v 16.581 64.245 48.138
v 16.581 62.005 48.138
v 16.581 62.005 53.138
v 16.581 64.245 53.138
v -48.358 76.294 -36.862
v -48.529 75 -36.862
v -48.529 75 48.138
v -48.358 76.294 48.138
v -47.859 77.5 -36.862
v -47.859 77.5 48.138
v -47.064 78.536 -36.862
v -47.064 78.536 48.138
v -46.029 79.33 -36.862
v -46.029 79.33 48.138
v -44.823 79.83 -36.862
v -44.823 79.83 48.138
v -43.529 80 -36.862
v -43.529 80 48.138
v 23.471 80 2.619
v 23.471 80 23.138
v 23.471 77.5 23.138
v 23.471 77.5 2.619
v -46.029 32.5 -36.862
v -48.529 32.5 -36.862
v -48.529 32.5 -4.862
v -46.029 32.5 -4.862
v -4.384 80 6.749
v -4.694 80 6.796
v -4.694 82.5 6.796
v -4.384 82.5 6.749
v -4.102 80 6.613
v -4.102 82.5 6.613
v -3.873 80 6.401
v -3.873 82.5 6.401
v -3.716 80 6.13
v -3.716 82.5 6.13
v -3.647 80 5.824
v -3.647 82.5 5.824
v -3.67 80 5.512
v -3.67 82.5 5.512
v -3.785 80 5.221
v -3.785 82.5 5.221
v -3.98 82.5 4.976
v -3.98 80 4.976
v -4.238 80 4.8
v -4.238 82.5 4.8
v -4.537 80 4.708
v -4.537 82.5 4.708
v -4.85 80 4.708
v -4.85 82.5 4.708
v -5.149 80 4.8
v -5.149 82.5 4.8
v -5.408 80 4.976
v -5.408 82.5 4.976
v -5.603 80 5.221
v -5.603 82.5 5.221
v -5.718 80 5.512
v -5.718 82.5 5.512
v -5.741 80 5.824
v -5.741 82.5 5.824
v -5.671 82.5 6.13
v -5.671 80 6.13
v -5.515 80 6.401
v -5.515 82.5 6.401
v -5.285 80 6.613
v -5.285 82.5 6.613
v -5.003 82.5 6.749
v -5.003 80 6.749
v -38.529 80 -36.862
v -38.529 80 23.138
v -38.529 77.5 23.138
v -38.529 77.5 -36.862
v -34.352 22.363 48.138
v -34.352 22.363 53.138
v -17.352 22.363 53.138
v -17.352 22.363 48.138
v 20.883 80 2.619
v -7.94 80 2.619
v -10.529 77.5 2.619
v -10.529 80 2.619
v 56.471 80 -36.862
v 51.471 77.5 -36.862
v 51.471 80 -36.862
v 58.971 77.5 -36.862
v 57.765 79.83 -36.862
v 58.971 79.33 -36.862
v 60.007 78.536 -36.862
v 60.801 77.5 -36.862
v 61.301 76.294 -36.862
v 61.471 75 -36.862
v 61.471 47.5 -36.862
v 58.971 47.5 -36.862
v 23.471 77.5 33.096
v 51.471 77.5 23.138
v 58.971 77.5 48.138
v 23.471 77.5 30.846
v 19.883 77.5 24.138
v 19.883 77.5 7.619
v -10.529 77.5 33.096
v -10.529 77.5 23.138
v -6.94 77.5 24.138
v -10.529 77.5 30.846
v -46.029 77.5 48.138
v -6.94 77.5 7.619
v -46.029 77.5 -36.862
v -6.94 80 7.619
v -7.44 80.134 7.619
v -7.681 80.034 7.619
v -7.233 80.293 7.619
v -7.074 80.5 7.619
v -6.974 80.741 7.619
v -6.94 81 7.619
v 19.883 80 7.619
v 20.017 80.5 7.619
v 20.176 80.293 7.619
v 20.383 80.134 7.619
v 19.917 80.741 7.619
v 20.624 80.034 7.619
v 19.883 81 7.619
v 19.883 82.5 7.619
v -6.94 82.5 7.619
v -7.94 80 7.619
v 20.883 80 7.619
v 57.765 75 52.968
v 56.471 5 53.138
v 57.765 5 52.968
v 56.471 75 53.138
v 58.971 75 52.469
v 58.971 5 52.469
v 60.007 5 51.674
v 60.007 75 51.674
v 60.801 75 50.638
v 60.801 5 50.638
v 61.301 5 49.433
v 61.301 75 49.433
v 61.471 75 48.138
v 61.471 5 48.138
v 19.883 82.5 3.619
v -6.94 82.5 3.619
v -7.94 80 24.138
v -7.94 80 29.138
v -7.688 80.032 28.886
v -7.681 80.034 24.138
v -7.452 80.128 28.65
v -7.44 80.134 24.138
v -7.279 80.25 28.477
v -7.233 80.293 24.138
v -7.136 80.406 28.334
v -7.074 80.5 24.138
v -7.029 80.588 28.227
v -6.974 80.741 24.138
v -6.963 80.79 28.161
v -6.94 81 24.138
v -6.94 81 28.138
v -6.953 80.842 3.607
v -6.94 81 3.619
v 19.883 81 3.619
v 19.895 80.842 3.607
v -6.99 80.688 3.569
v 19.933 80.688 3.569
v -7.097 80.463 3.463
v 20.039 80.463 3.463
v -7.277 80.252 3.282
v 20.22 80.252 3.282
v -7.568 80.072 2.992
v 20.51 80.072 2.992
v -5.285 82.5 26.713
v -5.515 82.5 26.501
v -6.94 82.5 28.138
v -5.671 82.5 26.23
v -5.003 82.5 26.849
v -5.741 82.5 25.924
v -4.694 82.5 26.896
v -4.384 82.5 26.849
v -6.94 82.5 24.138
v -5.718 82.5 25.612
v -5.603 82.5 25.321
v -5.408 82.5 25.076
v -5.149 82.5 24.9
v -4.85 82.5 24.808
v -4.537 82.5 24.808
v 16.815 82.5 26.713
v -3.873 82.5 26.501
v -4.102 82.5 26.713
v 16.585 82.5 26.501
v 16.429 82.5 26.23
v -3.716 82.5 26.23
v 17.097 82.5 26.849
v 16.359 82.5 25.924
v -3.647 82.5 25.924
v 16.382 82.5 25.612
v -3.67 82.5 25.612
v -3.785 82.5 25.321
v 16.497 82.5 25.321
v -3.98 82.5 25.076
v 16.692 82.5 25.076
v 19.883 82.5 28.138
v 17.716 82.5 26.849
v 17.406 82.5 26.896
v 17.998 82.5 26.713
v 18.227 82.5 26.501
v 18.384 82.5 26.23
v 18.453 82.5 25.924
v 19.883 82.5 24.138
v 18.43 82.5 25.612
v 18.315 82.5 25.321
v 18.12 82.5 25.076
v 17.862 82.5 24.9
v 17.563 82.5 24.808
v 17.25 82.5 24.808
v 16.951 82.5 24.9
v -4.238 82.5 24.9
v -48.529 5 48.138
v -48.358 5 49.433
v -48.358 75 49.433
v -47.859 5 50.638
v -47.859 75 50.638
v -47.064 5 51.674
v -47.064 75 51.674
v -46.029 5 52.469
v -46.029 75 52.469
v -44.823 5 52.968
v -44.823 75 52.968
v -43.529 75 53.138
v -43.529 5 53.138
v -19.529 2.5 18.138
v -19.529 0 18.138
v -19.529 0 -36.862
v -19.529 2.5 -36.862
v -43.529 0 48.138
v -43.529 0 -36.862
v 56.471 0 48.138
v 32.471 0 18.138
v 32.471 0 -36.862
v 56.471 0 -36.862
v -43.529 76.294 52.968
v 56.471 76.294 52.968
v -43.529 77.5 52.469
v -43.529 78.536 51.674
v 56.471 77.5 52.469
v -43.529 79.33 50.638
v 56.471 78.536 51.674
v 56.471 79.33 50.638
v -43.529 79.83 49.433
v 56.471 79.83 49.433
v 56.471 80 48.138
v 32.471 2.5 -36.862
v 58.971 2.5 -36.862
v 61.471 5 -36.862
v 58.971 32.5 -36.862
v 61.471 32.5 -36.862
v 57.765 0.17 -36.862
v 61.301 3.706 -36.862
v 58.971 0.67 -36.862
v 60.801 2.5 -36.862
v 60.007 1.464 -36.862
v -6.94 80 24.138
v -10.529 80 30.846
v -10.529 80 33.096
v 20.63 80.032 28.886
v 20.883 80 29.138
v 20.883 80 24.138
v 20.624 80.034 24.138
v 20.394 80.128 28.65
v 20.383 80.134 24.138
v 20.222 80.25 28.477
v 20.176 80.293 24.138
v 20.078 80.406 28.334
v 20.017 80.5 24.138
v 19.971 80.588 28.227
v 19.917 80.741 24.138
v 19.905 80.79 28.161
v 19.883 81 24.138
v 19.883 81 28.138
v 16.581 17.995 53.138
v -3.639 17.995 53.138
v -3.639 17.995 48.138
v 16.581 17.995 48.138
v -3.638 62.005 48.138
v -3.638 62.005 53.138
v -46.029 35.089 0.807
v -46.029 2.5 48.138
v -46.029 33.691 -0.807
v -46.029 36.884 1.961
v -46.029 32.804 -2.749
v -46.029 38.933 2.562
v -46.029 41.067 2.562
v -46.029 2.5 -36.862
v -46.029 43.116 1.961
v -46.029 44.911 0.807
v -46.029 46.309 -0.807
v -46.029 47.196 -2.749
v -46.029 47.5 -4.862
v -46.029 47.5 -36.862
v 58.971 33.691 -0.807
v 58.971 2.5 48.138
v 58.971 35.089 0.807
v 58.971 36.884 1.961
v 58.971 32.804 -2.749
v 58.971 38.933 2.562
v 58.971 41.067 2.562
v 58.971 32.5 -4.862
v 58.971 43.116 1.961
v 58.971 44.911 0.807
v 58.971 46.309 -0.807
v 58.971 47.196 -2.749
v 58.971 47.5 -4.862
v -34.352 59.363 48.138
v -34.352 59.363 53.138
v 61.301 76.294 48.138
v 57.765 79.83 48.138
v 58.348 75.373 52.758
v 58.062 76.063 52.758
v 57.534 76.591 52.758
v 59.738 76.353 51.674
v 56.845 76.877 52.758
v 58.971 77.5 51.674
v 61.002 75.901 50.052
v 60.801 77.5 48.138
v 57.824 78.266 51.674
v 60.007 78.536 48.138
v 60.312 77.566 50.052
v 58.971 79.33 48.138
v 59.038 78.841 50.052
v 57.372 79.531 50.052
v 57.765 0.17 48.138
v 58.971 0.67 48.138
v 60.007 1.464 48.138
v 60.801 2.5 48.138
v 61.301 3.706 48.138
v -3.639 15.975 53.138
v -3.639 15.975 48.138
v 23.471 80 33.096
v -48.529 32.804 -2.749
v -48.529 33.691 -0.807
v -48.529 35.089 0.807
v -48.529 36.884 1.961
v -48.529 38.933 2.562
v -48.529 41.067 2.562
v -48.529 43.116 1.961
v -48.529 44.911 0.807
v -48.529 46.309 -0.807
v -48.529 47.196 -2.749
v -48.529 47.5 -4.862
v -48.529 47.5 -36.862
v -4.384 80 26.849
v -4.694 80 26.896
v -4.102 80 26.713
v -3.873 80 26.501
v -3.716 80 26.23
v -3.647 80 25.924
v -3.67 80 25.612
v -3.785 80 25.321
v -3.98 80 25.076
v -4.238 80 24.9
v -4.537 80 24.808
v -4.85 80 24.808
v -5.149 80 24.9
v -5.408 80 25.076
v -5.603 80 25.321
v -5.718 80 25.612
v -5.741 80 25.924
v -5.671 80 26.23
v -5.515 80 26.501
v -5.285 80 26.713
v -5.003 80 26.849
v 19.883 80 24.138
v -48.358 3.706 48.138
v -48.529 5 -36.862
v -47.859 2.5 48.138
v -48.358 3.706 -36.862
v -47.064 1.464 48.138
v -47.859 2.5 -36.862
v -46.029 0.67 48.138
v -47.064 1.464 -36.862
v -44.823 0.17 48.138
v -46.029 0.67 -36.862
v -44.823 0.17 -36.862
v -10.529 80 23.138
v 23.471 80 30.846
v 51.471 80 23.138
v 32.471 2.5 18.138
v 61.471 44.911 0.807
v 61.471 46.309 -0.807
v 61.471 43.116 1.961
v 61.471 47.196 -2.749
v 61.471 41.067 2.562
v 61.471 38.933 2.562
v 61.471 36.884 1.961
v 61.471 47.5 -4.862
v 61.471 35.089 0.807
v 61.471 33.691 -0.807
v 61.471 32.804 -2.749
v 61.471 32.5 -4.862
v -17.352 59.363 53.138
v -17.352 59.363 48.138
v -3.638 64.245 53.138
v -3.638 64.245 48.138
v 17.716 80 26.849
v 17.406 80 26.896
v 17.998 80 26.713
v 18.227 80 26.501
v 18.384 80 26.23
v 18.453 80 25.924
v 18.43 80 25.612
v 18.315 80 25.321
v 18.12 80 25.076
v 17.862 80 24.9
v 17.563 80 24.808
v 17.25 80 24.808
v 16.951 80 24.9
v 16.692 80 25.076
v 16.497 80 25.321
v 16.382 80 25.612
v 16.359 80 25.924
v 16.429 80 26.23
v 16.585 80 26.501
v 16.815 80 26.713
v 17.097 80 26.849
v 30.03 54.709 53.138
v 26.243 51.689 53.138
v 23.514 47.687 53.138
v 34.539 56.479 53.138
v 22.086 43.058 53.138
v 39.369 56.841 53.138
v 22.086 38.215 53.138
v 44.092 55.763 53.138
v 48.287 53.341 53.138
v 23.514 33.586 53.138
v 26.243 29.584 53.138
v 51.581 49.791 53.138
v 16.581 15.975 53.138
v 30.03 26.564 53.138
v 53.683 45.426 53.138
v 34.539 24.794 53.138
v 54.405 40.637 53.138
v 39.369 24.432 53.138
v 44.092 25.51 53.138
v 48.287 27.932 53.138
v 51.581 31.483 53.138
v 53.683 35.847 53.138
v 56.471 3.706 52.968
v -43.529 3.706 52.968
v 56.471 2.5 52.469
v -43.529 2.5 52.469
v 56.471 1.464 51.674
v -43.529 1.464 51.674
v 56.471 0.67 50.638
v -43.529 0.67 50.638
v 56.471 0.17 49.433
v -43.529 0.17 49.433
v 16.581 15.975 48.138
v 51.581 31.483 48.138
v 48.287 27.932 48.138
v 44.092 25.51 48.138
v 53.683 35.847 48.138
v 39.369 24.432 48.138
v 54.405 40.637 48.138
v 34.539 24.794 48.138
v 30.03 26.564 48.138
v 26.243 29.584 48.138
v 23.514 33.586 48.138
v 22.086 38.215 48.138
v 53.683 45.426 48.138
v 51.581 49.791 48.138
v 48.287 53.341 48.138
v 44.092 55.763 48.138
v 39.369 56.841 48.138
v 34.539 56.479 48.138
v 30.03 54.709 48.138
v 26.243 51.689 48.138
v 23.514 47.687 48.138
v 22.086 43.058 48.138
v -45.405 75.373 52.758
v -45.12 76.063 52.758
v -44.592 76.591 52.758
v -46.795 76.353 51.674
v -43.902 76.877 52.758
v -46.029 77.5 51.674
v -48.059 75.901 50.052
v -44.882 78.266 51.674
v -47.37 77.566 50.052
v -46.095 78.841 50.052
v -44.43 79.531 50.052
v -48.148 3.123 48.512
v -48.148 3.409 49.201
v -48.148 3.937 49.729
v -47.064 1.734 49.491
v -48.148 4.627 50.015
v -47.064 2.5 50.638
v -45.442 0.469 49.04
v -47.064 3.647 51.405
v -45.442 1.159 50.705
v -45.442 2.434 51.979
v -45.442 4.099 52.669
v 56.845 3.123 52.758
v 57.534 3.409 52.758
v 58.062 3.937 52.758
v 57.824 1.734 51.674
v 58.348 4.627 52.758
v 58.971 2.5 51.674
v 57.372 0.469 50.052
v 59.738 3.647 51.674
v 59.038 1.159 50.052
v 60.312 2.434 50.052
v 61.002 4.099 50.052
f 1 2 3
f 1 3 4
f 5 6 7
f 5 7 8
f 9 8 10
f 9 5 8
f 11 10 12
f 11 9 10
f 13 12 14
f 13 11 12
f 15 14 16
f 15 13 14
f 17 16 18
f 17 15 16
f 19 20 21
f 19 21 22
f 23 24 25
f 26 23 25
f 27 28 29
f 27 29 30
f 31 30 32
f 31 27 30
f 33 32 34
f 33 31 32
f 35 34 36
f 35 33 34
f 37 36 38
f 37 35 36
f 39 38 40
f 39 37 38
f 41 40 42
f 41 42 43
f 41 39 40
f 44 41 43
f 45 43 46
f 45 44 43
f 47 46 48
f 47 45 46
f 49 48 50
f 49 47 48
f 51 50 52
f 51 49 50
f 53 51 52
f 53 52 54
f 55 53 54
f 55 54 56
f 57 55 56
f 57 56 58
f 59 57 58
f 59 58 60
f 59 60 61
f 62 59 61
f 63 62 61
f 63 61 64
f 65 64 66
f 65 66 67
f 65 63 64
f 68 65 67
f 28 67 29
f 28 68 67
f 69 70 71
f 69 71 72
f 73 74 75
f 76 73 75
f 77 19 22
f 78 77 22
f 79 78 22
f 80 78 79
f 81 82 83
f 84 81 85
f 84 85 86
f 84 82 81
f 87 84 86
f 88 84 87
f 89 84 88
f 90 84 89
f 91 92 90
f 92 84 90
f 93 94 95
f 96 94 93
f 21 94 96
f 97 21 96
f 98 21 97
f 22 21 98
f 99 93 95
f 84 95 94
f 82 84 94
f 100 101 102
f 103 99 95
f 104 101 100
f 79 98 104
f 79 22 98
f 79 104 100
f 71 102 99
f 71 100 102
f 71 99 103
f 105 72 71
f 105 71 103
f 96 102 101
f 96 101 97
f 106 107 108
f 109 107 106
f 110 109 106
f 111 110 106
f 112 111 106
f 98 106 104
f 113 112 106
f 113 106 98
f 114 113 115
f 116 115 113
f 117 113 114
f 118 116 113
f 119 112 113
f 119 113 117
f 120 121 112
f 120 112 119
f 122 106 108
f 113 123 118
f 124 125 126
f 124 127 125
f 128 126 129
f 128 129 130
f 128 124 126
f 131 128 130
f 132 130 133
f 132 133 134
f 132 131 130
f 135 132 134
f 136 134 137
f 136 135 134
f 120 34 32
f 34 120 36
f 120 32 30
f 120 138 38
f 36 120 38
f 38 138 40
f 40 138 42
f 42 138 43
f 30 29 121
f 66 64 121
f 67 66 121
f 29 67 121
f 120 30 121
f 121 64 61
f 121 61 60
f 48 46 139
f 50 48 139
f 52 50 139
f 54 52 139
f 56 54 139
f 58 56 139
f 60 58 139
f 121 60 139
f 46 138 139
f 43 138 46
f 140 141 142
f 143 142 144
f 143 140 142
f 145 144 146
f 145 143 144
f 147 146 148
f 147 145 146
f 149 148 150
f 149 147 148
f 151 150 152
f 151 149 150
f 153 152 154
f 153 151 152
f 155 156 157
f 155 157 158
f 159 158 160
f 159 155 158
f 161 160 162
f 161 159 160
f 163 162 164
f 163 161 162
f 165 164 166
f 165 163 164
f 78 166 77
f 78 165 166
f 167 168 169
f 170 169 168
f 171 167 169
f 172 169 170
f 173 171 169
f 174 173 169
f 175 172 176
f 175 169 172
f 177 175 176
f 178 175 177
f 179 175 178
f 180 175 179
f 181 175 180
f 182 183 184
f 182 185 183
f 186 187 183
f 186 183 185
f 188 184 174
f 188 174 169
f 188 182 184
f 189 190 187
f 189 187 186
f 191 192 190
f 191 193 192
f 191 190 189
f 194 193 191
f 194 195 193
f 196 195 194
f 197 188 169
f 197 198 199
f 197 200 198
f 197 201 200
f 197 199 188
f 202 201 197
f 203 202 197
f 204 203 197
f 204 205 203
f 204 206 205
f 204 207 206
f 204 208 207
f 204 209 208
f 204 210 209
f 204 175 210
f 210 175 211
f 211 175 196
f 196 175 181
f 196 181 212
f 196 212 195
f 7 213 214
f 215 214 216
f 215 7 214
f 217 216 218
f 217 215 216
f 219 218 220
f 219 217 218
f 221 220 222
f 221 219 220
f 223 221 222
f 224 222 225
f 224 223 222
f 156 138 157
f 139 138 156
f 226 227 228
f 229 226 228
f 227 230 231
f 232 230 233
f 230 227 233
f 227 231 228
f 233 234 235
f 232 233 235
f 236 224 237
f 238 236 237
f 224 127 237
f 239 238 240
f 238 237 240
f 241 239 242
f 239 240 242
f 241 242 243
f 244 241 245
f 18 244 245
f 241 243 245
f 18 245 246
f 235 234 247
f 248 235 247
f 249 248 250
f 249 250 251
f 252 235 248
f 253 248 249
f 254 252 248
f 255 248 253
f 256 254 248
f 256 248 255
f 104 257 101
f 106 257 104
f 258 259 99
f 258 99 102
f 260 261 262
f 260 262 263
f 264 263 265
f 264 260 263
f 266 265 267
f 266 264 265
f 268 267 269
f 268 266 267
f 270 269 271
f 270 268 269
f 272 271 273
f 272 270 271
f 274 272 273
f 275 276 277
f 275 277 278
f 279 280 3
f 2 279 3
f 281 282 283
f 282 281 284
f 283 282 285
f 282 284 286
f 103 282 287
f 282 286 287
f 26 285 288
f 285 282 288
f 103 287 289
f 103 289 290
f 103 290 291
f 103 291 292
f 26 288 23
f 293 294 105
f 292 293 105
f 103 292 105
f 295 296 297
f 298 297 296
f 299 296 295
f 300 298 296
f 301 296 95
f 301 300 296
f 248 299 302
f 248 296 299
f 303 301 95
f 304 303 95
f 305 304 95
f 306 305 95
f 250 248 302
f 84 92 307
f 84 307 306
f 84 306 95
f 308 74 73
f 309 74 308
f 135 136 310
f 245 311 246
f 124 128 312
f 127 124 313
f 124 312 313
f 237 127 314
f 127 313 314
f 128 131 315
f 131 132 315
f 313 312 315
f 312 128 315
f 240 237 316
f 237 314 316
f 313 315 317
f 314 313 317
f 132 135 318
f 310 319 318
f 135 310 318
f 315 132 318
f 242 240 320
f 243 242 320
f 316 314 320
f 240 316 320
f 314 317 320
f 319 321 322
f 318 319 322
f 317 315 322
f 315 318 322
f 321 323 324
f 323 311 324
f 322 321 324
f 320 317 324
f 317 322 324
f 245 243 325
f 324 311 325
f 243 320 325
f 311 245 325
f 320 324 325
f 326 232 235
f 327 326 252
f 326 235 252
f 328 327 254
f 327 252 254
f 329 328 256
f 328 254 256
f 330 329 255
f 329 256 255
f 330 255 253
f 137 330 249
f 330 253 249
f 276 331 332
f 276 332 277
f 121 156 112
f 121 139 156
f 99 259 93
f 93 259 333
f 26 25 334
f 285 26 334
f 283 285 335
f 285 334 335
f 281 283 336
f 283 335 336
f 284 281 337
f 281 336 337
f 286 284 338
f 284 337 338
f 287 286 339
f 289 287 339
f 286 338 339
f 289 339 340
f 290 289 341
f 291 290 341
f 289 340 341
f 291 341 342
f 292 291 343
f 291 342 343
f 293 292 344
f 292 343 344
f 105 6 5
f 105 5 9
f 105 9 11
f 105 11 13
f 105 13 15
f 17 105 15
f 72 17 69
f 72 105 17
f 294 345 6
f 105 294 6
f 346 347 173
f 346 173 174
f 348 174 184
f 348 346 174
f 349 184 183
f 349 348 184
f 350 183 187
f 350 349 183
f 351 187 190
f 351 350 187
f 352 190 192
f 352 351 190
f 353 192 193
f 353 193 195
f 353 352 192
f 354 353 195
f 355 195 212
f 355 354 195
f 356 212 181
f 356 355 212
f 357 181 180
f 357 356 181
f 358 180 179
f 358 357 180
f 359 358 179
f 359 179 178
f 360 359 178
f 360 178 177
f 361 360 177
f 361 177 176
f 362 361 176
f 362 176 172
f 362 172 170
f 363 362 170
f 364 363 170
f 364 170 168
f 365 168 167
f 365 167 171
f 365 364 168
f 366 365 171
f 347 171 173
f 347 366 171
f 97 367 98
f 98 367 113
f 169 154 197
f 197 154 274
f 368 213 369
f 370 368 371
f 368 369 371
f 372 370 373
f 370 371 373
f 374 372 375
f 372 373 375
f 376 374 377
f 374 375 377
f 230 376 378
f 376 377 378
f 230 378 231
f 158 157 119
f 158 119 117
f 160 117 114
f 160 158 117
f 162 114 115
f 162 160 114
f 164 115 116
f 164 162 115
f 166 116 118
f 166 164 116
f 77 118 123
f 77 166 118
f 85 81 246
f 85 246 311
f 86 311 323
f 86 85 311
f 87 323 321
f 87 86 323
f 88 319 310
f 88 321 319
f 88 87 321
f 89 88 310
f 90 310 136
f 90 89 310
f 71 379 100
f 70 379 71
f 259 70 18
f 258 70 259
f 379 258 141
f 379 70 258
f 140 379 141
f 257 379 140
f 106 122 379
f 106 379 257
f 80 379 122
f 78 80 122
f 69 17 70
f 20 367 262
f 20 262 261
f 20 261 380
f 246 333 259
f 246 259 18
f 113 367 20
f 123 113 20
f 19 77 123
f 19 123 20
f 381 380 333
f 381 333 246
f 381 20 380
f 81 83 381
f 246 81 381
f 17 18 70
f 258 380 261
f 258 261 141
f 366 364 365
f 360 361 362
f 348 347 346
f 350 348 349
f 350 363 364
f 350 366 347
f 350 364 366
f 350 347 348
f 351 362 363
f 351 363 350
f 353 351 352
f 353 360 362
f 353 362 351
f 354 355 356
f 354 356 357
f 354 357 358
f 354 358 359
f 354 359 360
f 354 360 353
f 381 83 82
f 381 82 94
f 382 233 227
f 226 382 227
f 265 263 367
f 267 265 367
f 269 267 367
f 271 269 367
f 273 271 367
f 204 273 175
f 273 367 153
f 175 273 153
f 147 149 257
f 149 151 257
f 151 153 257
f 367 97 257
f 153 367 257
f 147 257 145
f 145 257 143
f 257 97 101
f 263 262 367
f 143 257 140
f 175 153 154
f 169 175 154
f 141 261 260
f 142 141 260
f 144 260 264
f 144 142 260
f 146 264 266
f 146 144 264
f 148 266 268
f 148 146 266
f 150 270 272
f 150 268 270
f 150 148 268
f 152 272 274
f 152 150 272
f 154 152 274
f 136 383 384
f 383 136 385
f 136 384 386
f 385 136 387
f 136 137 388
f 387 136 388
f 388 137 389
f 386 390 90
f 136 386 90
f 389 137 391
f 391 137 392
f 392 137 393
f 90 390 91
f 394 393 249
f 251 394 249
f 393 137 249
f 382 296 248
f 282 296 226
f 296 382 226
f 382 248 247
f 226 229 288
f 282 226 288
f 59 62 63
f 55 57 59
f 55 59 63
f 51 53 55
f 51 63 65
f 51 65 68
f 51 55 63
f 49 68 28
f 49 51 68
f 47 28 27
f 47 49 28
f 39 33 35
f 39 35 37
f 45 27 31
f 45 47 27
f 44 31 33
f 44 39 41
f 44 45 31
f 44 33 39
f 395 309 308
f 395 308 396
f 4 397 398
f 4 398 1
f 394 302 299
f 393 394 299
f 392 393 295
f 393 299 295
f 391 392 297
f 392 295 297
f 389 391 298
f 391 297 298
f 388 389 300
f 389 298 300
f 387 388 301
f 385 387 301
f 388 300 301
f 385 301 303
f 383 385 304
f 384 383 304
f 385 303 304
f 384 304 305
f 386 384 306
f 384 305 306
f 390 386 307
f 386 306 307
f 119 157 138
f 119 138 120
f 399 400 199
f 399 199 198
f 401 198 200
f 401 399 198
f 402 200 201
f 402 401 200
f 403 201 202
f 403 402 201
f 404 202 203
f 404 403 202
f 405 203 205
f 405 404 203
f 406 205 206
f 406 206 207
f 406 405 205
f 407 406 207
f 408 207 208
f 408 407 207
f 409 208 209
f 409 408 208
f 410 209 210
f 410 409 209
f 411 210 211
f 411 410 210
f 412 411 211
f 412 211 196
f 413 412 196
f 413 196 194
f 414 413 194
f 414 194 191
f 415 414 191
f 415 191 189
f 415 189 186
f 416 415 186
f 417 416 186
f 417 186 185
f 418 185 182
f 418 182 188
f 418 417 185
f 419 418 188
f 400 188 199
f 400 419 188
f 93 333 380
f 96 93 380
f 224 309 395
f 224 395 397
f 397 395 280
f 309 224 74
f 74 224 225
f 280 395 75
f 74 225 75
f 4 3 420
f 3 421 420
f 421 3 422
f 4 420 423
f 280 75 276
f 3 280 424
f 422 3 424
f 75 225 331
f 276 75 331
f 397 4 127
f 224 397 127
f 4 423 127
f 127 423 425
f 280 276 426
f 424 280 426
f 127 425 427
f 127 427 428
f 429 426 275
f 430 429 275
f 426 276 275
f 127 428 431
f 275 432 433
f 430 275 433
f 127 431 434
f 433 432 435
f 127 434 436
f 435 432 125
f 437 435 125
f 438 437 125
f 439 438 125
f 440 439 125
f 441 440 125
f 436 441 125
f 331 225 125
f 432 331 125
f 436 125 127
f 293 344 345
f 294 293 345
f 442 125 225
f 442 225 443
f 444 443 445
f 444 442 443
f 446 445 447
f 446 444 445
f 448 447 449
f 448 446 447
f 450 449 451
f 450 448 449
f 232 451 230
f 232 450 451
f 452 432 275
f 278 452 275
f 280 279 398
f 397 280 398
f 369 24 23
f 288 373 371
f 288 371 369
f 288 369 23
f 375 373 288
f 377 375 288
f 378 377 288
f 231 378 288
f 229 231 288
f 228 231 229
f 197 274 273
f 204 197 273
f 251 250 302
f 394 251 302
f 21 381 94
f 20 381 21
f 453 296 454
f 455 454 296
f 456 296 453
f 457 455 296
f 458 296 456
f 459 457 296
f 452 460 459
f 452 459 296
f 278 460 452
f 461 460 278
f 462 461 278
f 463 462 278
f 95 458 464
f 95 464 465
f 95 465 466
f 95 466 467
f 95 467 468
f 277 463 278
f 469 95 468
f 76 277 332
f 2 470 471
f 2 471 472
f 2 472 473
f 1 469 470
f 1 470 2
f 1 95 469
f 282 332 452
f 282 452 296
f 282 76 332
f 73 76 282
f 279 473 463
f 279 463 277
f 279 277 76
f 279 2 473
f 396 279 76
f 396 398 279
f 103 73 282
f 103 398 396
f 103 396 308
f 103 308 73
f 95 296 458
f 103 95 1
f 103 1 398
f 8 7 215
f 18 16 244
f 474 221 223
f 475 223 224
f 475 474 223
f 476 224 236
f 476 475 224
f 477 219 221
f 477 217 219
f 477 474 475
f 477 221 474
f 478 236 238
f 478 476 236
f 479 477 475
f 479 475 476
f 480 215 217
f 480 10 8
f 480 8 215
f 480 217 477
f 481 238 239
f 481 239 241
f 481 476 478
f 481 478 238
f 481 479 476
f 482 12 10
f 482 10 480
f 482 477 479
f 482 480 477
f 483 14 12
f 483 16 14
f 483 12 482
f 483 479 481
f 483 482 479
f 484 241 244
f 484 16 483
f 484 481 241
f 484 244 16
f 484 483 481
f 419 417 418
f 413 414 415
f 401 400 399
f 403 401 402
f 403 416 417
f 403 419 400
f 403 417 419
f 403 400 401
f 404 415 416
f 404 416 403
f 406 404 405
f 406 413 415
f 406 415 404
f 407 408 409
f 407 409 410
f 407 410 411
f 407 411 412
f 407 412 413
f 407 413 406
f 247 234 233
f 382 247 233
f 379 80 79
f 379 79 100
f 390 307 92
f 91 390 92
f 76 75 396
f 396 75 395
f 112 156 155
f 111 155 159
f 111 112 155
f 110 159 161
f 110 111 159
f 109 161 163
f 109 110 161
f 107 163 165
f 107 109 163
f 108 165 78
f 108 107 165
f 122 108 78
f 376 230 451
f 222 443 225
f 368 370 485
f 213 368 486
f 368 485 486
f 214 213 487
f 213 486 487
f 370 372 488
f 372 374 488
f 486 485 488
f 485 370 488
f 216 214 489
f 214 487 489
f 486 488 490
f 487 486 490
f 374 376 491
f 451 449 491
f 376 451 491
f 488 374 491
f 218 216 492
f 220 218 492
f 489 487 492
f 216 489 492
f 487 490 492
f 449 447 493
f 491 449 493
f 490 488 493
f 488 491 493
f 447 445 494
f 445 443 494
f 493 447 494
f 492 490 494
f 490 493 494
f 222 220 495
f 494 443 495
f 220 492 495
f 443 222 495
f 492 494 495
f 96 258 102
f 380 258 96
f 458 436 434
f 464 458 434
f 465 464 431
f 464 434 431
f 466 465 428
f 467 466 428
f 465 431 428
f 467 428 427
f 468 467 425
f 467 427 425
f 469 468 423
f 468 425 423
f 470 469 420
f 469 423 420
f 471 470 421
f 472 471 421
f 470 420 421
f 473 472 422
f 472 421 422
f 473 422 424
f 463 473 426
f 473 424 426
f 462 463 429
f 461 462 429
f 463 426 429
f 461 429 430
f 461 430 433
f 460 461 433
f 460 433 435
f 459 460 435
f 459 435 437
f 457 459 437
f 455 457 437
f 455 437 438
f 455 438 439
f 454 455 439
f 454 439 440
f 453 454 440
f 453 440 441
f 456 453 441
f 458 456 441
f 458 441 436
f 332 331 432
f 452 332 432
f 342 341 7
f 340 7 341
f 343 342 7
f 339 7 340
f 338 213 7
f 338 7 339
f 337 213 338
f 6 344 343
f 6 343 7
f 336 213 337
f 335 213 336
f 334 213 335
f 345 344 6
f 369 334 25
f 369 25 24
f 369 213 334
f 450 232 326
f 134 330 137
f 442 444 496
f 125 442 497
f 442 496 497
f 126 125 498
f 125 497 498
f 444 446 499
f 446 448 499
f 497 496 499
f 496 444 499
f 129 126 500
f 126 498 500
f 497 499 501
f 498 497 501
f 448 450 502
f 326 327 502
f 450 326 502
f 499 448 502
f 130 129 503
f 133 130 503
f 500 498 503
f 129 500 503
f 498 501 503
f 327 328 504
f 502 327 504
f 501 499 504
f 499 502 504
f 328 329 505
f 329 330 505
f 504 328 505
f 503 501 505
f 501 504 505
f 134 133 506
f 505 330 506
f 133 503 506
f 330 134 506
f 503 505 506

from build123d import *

# Parameters (mm, degrees)
ESQUISSE1_W             = 110
ESQUISSE1_H             = 100
BOSS_EXTRU_1_DEPTH      = 80
ESQUISSE3_W             = 105
ESQUISSE3_H             = 75
ENL_V_MAT_EXTRU_1_DEPTH = 95
ESQUISSE4_R             = 16.25
ESQUISSE4_W             = 17
ESQUISSE4_H             = 37
ESQUISSE4_W_2           = 20.218803133
ESQUISSE4_H_2           = 2.24
ESQUISSE4_W_3           = 20.22
ESQUISSE4_H_3           = 2.019806643
ENL_V_MAT_EXTRU_2_DEPTH = 143.051816821
CONG_2_R                = 5
ENL_V_MAT_EXTRU_3_DEPTH = 25
ENL_V_MAT_EXTRU_4_DEPTH = 147.026353909
ESQUISSE7_W             = 110
ESQUISSE7_H             = 10
ENL_V_MAT_EXTRU_5_DEPTH = 115.028131169
ESQUISSE8_R             = 1.05
BOSS_EXTRU_4_DEPTH      = 2.5
ESQUISSE12_W            = 26.823119757
ESQUISSE12_H            = 16.51929352
ENL_V_MAT_EXTRU_8_DEPTH = 2.5
CONG_3_R                = 1
ESQUISSE13_W            = 34
ESQUISSE13_H            = 2.25
ENL_V_MAT_EXTRU_9_DEPTH = 10


with BuildPart() as part:
    # Esquisse1 → Boss.-Extru.1 (new body)
    with BuildSketch(Plane(origin=(0, 0, 0), x_dir=(1, 0, 0), z_dir=(0, 1, 0))):
        with Locations((6.471283231, -3.138460985)):
            Rectangle(ESQUISSE1_W, ESQUISSE1_H)
    extrude(amount=BOSS_EXTRU_1_DEPTH)

    # Esquisse3 → Enlèv. mat.-Extru.1 (cut)
    with BuildSketch(Plane(origin=(0, 0, -46.861539015), x_dir=(-1, 0, 0), z_dir=(0, 0, -1))):
        with Locations((-6.471283231, 40)):
            Rectangle(ESQUISSE3_W, ESQUISSE3_H)
    extrude(amount=-ENL_V_MAT_EXTRU_1_DEPTH, mode=Mode.SUBTRACT)

    # Esquisse4 → Enlèv. mat.-Extru.2 (cut, through all)
    with BuildSketch(Plane.XY.offset(53.138460985)):
        with Locations((38.154925434, 40.636559031)):
            Circle(ESQUISSE4_R)
        with Locations((-25.851622586, 40.86253144)):
            Rectangle(ESQUISSE4_W, ESQUISSE4_H)
        with Locations((6.471283232, 63.12509684)):
            Rectangle(ESQUISSE4_W_2, ESQUISSE4_H_2)
        with Locations((6.470684798, 16.984999839)):
            Rectangle(ESQUISSE4_W_3, ESQUISSE4_H_3)
    extrude(amount=-ENL_V_MAT_EXTRU_2_DEPTH, mode=Mode.SUBTRACT)

    # Congé2
    cong_2_edges = [part.edges().sort_by_distance(p)[0] for p in [
        (61.471283231, 80, 3.138460985),
        (-48.528716769, 80, 3.138460985),
        (61.471283231, 0, 3.138460985),
        (6.471283231, 0, 53.138460985),
        (-48.528716769, 0, 3.138460985),
        (61.471283231, 40, 53.138460985),
        (-48.528716769, 40, 53.138460985),
        (6.471283231, 80, 53.138460985),
    ]]
    fillet(cong_2_edges, radius=CONG_2_R)

    # Esquisse5 → Enlèv. mat.-Extru.3 (cut)
    with BuildSketch(Plane.XZ):
        Polygon((6.471283231, -46.861539015), (32.471283231, -46.861539015), (32.471283231, 18.138460985), (-19.528716769, 18.138460985), (-19.528716769, -46.861539015), align=None)
    extrude(amount=-ENL_V_MAT_EXTRU_3_DEPTH, mode=Mode.SUBTRACT)

    # Esquisse6 → Enlèv. mat.-Extru.4 (cut, through all)
    with BuildSketch(Plane.ZY.offset(48.528716769)):
        with BuildLine():
            Line((-4.861539015, 47.5), (-46.861539015, 47.5))
            Line((-46.861539015, 47.5), (-46.861539015, 32.5))
            Line((-46.861539015, 32.5), (-4.861539015, 32.5))
            ThreePointArc((-4.861539015, 32.5), (2.638460985, 40), (-4.861539015, 47.5))
        make_face()
    extrude(amount=-ENL_V_MAT_EXTRU_4_DEPTH, mode=Mode.SUBTRACT)

    # Esquisse7 → Enlèv. mat.-Extru.5 (cut, through all)
    with BuildSketch(Plane.XZ):
        with Locations((6.471283231, -41.861539015)):
            Rectangle(ESQUISSE7_W, ESQUISSE7_H)
    extrude(amount=-ENL_V_MAT_EXTRU_5_DEPTH, mode=Mode.SUBTRACT)

    # Esquisse8 → Boss.-Extru.4 (add)
    # profile 1 of 2: a face of its own
    with BuildSketch(Plane(origin=(0, 80, 0), x_dir=(1, 0, 0), z_dir=(0, 1, 0))):
        Polygon((-6.940276647, -28.138460985), (19.88284311, -28.138460985), (19.88284311, -24.138460985), (2.406600831, -24.138460985), (-6.940276647, -24.138460985), align=None)
        with Locations(Location((17.406091919, -25.845902422, 0), (0, 0, 270))):
            Circle(ESQUISSE8_R, mode=Mode.SUBTRACT)
        with Locations(Location((-4.693908081, -25.845902422, 0), (0, 0, 270))):
            Circle(ESQUISSE8_R, mode=Mode.SUBTRACT)
    # profile 2 of 2: a face of its own
    with BuildSketch(Plane(origin=(0, 80, 0), x_dir=(1, 0, 0), z_dir=(0, 1, 0))):
        Polygon((-6.940276647, -3.619167465), (19.88284311, -3.619167465), (19.88284311, -7.619167465), (2.406600831, -7.619167465), (-6.940276647, -7.619167465), align=None)
        with Locations(Location((-4.693908081, -5.745902422, 0), (0, 0, 270))):
            Circle(ESQUISSE8_R, mode=Mode.SUBTRACT)
    extrude(amount=BOSS_EXTRU_4_DEPTH)

    # Esquisse12 → Enlèv. mat.-Extru.8 (cut)
    with BuildSketch(Plane(origin=(0, 80, 0), x_dir=(1, 0, 0), z_dir=(0, 1, 0))):
        with Locations((6.471283231, -15.878814225)):
            Rectangle(ESQUISSE12_W, ESQUISSE12_H)
    extrude(amount=-ENL_V_MAT_EXTRU_8_DEPTH, mode=Mode.SUBTRACT)

    # Congé3
    # the kernel refuses this fillet: 1 mm, written as the material it adds along each edge
    with BuildSketch(Plane(origin=(19.88284311, 80, 3.619167465), x_dir=(1, 0, 0), z_dir=(0, 0, 1))) as cong_3_piece_1_section:
        with BuildLine():
            CenterArc((CONG_3_R, CONG_3_R), CONG_3_R, 180, 90)
            Line((0, CONG_3_R), (-CONG_3_R * 0.02, CONG_3_R))
            Line((-CONG_3_R * 0.02, CONG_3_R), (-CONG_3_R * 0.02, -CONG_3_R * 0.02))
            Line((-CONG_3_R * 0.02, -CONG_3_R * 0.02), (CONG_3_R, -CONG_3_R * 0.02))
            Line((CONG_3_R, -CONG_3_R * 0.02), (CONG_3_R, 0))
        make_face()
    cong_3_piece_1 = extrude(amount=4, mode=Mode.PRIVATE)
    cong_3_piece_1 = split(cong_3_piece_1, bisect_by=Plane(origin=(19.88284311, 80.20347313, 5.619167465), z_dir=(1, 0, 0)), keep=Keep.TOP, mode=Mode.PRIVATE)
    add(cong_3_piece_1)
    with BuildSketch(Plane(origin=(-6.940276647, 80, 3.619167465), x_dir=(0, 0, -1), z_dir=(1, 0, 0))) as cong_3_piece_2:
        with BuildLine():
            CenterArc((CONG_3_R, CONG_3_R), CONG_3_R, 180, 90)
            Line((0, CONG_3_R), (-CONG_3_R * 0.02, CONG_3_R))
            Line((-CONG_3_R * 0.02, CONG_3_R), (-CONG_3_R * 0.02, -CONG_3_R * 0.02))
            Line((-CONG_3_R * 0.02, -CONG_3_R * 0.02), (CONG_3_R, -CONG_3_R * 0.02))
            Line((CONG_3_R, -CONG_3_R * 0.02), (CONG_3_R, 0))
        make_face()
    extrude(amount=26.823119757)
    with BuildSketch(Plane(origin=(-6.940276647, 80, 7.619167465), x_dir=(-1, 0, 0), z_dir=(0, 0, -1))) as cong_3_piece_3_section:
        with BuildLine():
            CenterArc((CONG_3_R, CONG_3_R), CONG_3_R, 180, 90)
            Line((0, CONG_3_R), (-CONG_3_R * 0.02, CONG_3_R))
            Line((-CONG_3_R * 0.02, CONG_3_R), (-CONG_3_R * 0.02, -CONG_3_R * 0.02))
            Line((-CONG_3_R * 0.02, -CONG_3_R * 0.02), (CONG_3_R, -CONG_3_R * 0.02))
            Line((CONG_3_R, -CONG_3_R * 0.02), (CONG_3_R, 0))
        make_face()
    cong_3_piece_3 = extrude(amount=4, mode=Mode.PRIVATE)
    cong_3_piece_3 = split(cong_3_piece_3, bisect_by=Plane(origin=(-6.940276647, 80.20347313, 5.619167465), z_dir=(-1, 0, 0)), keep=Keep.TOP, mode=Mode.PRIVATE)
    add(cong_3_piece_3)
    with BuildSketch(Plane(origin=(-6.940276647, 80, 24.138460985), x_dir=(-1, 0, 0), z_dir=(0, 0, 1))) as cong_3_piece_4_section:
        with BuildLine():
            CenterArc((CONG_3_R, -CONG_3_R), CONG_3_R, 90, 90)
            Line((0, -CONG_3_R), (-CONG_3_R * 0.02, -CONG_3_R))
            Line((-CONG_3_R * 0.02, -CONG_3_R), (-CONG_3_R * 0.02, CONG_3_R * 0.02))
            Line((-CONG_3_R * 0.02, CONG_3_R * 0.02), (CONG_3_R, CONG_3_R * 0.02))
            Line((CONG_3_R, CONG_3_R * 0.02), (CONG_3_R, 0))
        make_face()
    cong_3_piece_4 = extrude(amount=4, mode=Mode.PRIVATE)
    cong_3_piece_4 = split(cong_3_piece_4, bisect_by=Plane(origin=(-6.940276647, 80.20347313, 26.138460985), z_dir=(-1, 0, 0)), keep=Keep.TOP, mode=Mode.PRIVATE)
    add(cong_3_piece_4)
    with BuildSketch(Plane(origin=(-6.940276647, 80, 28.138460985), x_dir=(0, 0, 1), z_dir=(1, 0, 0))) as cong_3_piece_5:
        with BuildLine():
            CenterArc((CONG_3_R, -CONG_3_R), CONG_3_R, 90, 90)
            Line((0, -CONG_3_R), (-CONG_3_R * 0.02, -CONG_3_R))
            Line((-CONG_3_R * 0.02, -CONG_3_R), (-CONG_3_R * 0.02, CONG_3_R * 0.02))
            Line((-CONG_3_R * 0.02, CONG_3_R * 0.02), (CONG_3_R, CONG_3_R * 0.02))
            Line((CONG_3_R, CONG_3_R * 0.02), (CONG_3_R, 0))
        make_face()
    extrude(amount=26.823119757)
    with BuildSketch(Plane(origin=(19.88284311, 80, 28.138460985), x_dir=(1, 0, 0), z_dir=(0, 0, -1))) as cong_3_piece_6_section:
        with BuildLine():
            CenterArc((CONG_3_R, -CONG_3_R), CONG_3_R, 90, 90)
            Line((0, -CONG_3_R), (-CONG_3_R * 0.02, -CONG_3_R))
            Line((-CONG_3_R * 0.02, -CONG_3_R), (-CONG_3_R * 0.02, CONG_3_R * 0.02))
            Line((-CONG_3_R * 0.02, CONG_3_R * 0.02), (CONG_3_R, CONG_3_R * 0.02))
            Line((CONG_3_R, CONG_3_R * 0.02), (CONG_3_R, 0))
        make_face()
    cong_3_piece_6 = extrude(amount=4, mode=Mode.PRIVATE)
    cong_3_piece_6 = split(cong_3_piece_6, bisect_by=Plane(origin=(19.88284311, 80.20347313, 26.138460985), z_dir=(1, 0, 0)), keep=Keep.TOP, mode=Mode.PRIVATE)
    add(cong_3_piece_6)
    with BuildSketch(Plane(origin=(-6.940276647, 80, 3.619167465), x_dir=(0, 0, -1), z_dir=(1, 0, 0))) as cong_3_piece_7a_section:
        with BuildLine():
            CenterArc((CONG_3_R, CONG_3_R), CONG_3_R, 180, 90)
            Line((0, CONG_3_R), (-CONG_3_R * 0.02, CONG_3_R))
            Line((-CONG_3_R * 0.02, CONG_3_R), (-CONG_3_R * 0.02, -CONG_3_R * 0.02))
            Line((-CONG_3_R * 0.02, -CONG_3_R * 0.02), (CONG_3_R, -CONG_3_R * 0.02))
            Line((CONG_3_R, -CONG_3_R * 0.02), (CONG_3_R, 0))
        make_face()
    cong_3_piece_7a = extrude(amount=29.323119757, mode=Mode.PRIVATE)
    cong_3_piece_7a = split(cong_3_piece_7a, bisect_by=Plane(origin=(19.88284311, 80.226395114, 3.39277235), z_dir=(1, 0, 0)), keep=Keep.TOP, mode=Mode.PRIVATE)
    with BuildSketch(Plane(origin=(19.88284311, 80, 1.119167465), x_dir=(1, 0, 0), z_dir=(0, 0, 1))) as cong_3_piece_7b_section:
        with BuildLine():
            CenterArc((CONG_3_R, CONG_3_R), CONG_3_R, 180, 90)
            Line((0, CONG_3_R), (-CONG_3_R * 0.02, CONG_3_R))
            Line((-CONG_3_R * 0.02, CONG_3_R), (-CONG_3_R * 0.02, -CONG_3_R * 0.02))
            Line((-CONG_3_R * 0.02, -CONG_3_R * 0.02), (CONG_3_R, -CONG_3_R * 0.02))
            Line((CONG_3_R, -CONG_3_R * 0.02), (CONG_3_R, 0))
        make_face()
    cong_3_piece_7b = extrude(amount=6.5, mode=Mode.PRIVATE)
    cong_3_piece_7b = split(cong_3_piece_7b, bisect_by=Plane(origin=(19.88284311, 80.20347313, 2.369167465), z_dir=(1, 0, 0)), keep=Keep.TOP, mode=Mode.PRIVATE)
    cong_3_piece_7b = split(cong_3_piece_7b, bisect_by=Plane(origin=(20.12979416, 80.20347313, 3.619167465), z_dir=(0, 0, -1)), keep=Keep.TOP, mode=Mode.PRIVATE)
    cong_3_piece_7 = cong_3_piece_7a & cong_3_piece_7b
    add(cong_3_piece_7)
    with BuildSketch(Plane(origin=(-6.940276647, 80, 7.619167465), x_dir=(-1, 0, 0), z_dir=(0, 0, -1))) as cong_3_piece_8a_section:
        with BuildLine():
            CenterArc((CONG_3_R, CONG_3_R), CONG_3_R, 180, 90)
            Line((0, CONG_3_R), (-CONG_3_R * 0.02, CONG_3_R))
            Line((-CONG_3_R * 0.02, CONG_3_R), (-CONG_3_R * 0.02, -CONG_3_R * 0.02))
            Line((-CONG_3_R * 0.02, -CONG_3_R * 0.02), (CONG_3_R, -CONG_3_R * 0.02))
            Line((CONG_3_R, -CONG_3_R * 0.02), (CONG_3_R, 0))
        make_face()
    cong_3_piece_8a = extrude(amount=6.5, mode=Mode.PRIVATE)
    cong_3_piece_8a = split(cong_3_piece_8a, bisect_by=Plane(origin=(-6.940276647, 80.20347313, 2.369167465), z_dir=(-1, 0, 0)), keep=Keep.TOP, mode=Mode.PRIVATE)
    cong_3_piece_8a = split(cong_3_piece_8a, bisect_by=Plane(origin=(-7.187227698, 80.20347313, 3.619167465), z_dir=(0, 0, -1)), keep=Keep.TOP, mode=Mode.PRIVATE)
    with BuildSketch(Plane(origin=(-9.440276647, 80, 3.619167465), x_dir=(0, 0, -1), z_dir=(1, 0, 0))) as cong_3_piece_8b_section:
        with BuildLine():
            CenterArc((CONG_3_R, CONG_3_R), CONG_3_R, 180, 90)
            Line((0, CONG_3_R), (-CONG_3_R * 0.02, CONG_3_R))
            Line((-CONG_3_R * 0.02, CONG_3_R), (-CONG_3_R * 0.02, -CONG_3_R * 0.02))
            Line((-CONG_3_R * 0.02, -CONG_3_R * 0.02), (CONG_3_R, -CONG_3_R * 0.02))
            Line((CONG_3_R, -CONG_3_R * 0.02), (CONG_3_R, 0))
        make_face()
    cong_3_piece_8b = extrude(amount=29.323119757, mode=Mode.PRIVATE)
    cong_3_piece_8b = split(cong_3_piece_8b, bisect_by=Plane(origin=(-6.940276647, 80.226395114, 3.39277235), z_dir=(-1, 0, 0)), keep=Keep.TOP, mode=Mode.PRIVATE)
    cong_3_piece_8 = cong_3_piece_8a & cong_3_piece_8b
    add(cong_3_piece_8)
    with BuildSketch(Plane(origin=(-9.440276647, 80, 28.138460985), x_dir=(0, 0, 1), z_dir=(1, 0, 0))) as cong_3_piece_9a_section:
        with BuildLine():
            CenterArc((CONG_3_R, -CONG_3_R), CONG_3_R, 90, 90)
            Line((0, -CONG_3_R), (-CONG_3_R * 0.02, -CONG_3_R))
            Line((-CONG_3_R * 0.02, -CONG_3_R), (-CONG_3_R * 0.02, CONG_3_R * 0.02))
            Line((-CONG_3_R * 0.02, CONG_3_R * 0.02), (CONG_3_R, CONG_3_R * 0.02))
            Line((CONG_3_R, CONG_3_R * 0.02), (CONG_3_R, 0))
        make_face()
    cong_3_piece_9a = extrude(amount=29.323119757, mode=Mode.PRIVATE)
    cong_3_piece_9a = split(cong_3_piece_9a, bisect_by=Plane(origin=(-6.940276647, 80.226395114, 28.3648561), z_dir=(-1, 0, 0)), keep=Keep.TOP, mode=Mode.PRIVATE)
    with BuildSketch(Plane(origin=(-6.940276647, 80, 24.138460985), x_dir=(-1, 0, 0), z_dir=(0, 0, 1))) as cong_3_piece_9b_section:
        with BuildLine():
            CenterArc((CONG_3_R, -CONG_3_R), CONG_3_R, 90, 90)
            Line((0, -CONG_3_R), (-CONG_3_R * 0.02, -CONG_3_R))
            Line((-CONG_3_R * 0.02, -CONG_3_R), (-CONG_3_R * 0.02, CONG_3_R * 0.02))
            Line((-CONG_3_R * 0.02, CONG_3_R * 0.02), (CONG_3_R, CONG_3_R * 0.02))
            Line((CONG_3_R, CONG_3_R * 0.02), (CONG_3_R, 0))
        make_face()
    cong_3_piece_9b = extrude(amount=6.5, mode=Mode.PRIVATE)
    cong_3_piece_9b = split(cong_3_piece_9b, bisect_by=Plane(origin=(-6.940276647, 80.20347313, 29.388460985), z_dir=(-1, 0, 0)), keep=Keep.TOP, mode=Mode.PRIVATE)
    cong_3_piece_9b = split(cong_3_piece_9b, bisect_by=Plane(origin=(-7.187227698, 80.20347313, 28.138460985), z_dir=(0, 0, 1)), keep=Keep.TOP, mode=Mode.PRIVATE)
    cong_3_piece_9 = cong_3_piece_9a & cong_3_piece_9b
    add(cong_3_piece_9)
    with BuildSketch(Plane(origin=(19.88284311, 80, 30.638460985), x_dir=(1, 0, 0), z_dir=(0, 0, -1))) as cong_3_piece_10a_section:
        with BuildLine():
            CenterArc((CONG_3_R, -CONG_3_R), CONG_3_R, 90, 90)
            Line((0, -CONG_3_R), (-CONG_3_R * 0.02, -CONG_3_R))
            Line((-CONG_3_R * 0.02, -CONG_3_R), (-CONG_3_R * 0.02, CONG_3_R * 0.02))
            Line((-CONG_3_R * 0.02, CONG_3_R * 0.02), (CONG_3_R, CONG_3_R * 0.02))
            Line((CONG_3_R, CONG_3_R * 0.02), (CONG_3_R, 0))
        make_face()
    cong_3_piece_10a = extrude(amount=6.5, mode=Mode.PRIVATE)
    cong_3_piece_10a = split(cong_3_piece_10a, bisect_by=Plane(origin=(19.88284311, 80.20347313, 29.388460985), z_dir=(1, 0, 0)), keep=Keep.TOP, mode=Mode.PRIVATE)
    cong_3_piece_10a = split(cong_3_piece_10a, bisect_by=Plane(origin=(20.12979416, 80.20347313, 28.138460985), z_dir=(0, 0, 1)), keep=Keep.TOP, mode=Mode.PRIVATE)
    with BuildSketch(Plane(origin=(-6.940276647, 80, 28.138460985), x_dir=(0, 0, 1), z_dir=(1, 0, 0))) as cong_3_piece_10b_section:
        with BuildLine():
            CenterArc((CONG_3_R, -CONG_3_R), CONG_3_R, 90, 90)
            Line((0, -CONG_3_R), (-CONG_3_R * 0.02, -CONG_3_R))
            Line((-CONG_3_R * 0.02, -CONG_3_R), (-CONG_3_R * 0.02, CONG_3_R * 0.02))
            Line((-CONG_3_R * 0.02, CONG_3_R * 0.02), (CONG_3_R, CONG_3_R * 0.02))
            Line((CONG_3_R, CONG_3_R * 0.02), (CONG_3_R, 0))
        make_face()
    cong_3_piece_10b = extrude(amount=29.323119757, mode=Mode.PRIVATE)
    cong_3_piece_10b = split(cong_3_piece_10b, bisect_by=Plane(origin=(19.88284311, 80.226395114, 28.3648561), z_dir=(1, 0, 0)), keep=Keep.TOP, mode=Mode.PRIVATE)
    cong_3_piece_10 = cong_3_piece_10a & cong_3_piece_10b
    add(cong_3_piece_10)

    # Esquisse13 → Enlèv. mat.-Extru.9 (cut)
    with BuildSketch(Plane(origin=(0, 80, 0), x_dir=(1, 0, 0), z_dir=(0, 1, 0))):
        Polygon((-38.528716769, 36.861539015), (51.471283231, 36.861539015), (51.471283231, -23.138460985), (23.471283231, -23.138460985), (23.471283231, -2.619167465), (-10.528716769, -2.619167465), (-10.528716769, -23.138460985), (-38.528716769, -23.138460985), align=None)
        with Locations((6.471283231, -31.970902422)):
            Rectangle(ESQUISSE13_W, ESQUISSE13_H)
    extrude(amount=-ENL_V_MAT_EXTRU_9_DEPTH, mode=Mode.SUBTRACT)


solid = part.part
